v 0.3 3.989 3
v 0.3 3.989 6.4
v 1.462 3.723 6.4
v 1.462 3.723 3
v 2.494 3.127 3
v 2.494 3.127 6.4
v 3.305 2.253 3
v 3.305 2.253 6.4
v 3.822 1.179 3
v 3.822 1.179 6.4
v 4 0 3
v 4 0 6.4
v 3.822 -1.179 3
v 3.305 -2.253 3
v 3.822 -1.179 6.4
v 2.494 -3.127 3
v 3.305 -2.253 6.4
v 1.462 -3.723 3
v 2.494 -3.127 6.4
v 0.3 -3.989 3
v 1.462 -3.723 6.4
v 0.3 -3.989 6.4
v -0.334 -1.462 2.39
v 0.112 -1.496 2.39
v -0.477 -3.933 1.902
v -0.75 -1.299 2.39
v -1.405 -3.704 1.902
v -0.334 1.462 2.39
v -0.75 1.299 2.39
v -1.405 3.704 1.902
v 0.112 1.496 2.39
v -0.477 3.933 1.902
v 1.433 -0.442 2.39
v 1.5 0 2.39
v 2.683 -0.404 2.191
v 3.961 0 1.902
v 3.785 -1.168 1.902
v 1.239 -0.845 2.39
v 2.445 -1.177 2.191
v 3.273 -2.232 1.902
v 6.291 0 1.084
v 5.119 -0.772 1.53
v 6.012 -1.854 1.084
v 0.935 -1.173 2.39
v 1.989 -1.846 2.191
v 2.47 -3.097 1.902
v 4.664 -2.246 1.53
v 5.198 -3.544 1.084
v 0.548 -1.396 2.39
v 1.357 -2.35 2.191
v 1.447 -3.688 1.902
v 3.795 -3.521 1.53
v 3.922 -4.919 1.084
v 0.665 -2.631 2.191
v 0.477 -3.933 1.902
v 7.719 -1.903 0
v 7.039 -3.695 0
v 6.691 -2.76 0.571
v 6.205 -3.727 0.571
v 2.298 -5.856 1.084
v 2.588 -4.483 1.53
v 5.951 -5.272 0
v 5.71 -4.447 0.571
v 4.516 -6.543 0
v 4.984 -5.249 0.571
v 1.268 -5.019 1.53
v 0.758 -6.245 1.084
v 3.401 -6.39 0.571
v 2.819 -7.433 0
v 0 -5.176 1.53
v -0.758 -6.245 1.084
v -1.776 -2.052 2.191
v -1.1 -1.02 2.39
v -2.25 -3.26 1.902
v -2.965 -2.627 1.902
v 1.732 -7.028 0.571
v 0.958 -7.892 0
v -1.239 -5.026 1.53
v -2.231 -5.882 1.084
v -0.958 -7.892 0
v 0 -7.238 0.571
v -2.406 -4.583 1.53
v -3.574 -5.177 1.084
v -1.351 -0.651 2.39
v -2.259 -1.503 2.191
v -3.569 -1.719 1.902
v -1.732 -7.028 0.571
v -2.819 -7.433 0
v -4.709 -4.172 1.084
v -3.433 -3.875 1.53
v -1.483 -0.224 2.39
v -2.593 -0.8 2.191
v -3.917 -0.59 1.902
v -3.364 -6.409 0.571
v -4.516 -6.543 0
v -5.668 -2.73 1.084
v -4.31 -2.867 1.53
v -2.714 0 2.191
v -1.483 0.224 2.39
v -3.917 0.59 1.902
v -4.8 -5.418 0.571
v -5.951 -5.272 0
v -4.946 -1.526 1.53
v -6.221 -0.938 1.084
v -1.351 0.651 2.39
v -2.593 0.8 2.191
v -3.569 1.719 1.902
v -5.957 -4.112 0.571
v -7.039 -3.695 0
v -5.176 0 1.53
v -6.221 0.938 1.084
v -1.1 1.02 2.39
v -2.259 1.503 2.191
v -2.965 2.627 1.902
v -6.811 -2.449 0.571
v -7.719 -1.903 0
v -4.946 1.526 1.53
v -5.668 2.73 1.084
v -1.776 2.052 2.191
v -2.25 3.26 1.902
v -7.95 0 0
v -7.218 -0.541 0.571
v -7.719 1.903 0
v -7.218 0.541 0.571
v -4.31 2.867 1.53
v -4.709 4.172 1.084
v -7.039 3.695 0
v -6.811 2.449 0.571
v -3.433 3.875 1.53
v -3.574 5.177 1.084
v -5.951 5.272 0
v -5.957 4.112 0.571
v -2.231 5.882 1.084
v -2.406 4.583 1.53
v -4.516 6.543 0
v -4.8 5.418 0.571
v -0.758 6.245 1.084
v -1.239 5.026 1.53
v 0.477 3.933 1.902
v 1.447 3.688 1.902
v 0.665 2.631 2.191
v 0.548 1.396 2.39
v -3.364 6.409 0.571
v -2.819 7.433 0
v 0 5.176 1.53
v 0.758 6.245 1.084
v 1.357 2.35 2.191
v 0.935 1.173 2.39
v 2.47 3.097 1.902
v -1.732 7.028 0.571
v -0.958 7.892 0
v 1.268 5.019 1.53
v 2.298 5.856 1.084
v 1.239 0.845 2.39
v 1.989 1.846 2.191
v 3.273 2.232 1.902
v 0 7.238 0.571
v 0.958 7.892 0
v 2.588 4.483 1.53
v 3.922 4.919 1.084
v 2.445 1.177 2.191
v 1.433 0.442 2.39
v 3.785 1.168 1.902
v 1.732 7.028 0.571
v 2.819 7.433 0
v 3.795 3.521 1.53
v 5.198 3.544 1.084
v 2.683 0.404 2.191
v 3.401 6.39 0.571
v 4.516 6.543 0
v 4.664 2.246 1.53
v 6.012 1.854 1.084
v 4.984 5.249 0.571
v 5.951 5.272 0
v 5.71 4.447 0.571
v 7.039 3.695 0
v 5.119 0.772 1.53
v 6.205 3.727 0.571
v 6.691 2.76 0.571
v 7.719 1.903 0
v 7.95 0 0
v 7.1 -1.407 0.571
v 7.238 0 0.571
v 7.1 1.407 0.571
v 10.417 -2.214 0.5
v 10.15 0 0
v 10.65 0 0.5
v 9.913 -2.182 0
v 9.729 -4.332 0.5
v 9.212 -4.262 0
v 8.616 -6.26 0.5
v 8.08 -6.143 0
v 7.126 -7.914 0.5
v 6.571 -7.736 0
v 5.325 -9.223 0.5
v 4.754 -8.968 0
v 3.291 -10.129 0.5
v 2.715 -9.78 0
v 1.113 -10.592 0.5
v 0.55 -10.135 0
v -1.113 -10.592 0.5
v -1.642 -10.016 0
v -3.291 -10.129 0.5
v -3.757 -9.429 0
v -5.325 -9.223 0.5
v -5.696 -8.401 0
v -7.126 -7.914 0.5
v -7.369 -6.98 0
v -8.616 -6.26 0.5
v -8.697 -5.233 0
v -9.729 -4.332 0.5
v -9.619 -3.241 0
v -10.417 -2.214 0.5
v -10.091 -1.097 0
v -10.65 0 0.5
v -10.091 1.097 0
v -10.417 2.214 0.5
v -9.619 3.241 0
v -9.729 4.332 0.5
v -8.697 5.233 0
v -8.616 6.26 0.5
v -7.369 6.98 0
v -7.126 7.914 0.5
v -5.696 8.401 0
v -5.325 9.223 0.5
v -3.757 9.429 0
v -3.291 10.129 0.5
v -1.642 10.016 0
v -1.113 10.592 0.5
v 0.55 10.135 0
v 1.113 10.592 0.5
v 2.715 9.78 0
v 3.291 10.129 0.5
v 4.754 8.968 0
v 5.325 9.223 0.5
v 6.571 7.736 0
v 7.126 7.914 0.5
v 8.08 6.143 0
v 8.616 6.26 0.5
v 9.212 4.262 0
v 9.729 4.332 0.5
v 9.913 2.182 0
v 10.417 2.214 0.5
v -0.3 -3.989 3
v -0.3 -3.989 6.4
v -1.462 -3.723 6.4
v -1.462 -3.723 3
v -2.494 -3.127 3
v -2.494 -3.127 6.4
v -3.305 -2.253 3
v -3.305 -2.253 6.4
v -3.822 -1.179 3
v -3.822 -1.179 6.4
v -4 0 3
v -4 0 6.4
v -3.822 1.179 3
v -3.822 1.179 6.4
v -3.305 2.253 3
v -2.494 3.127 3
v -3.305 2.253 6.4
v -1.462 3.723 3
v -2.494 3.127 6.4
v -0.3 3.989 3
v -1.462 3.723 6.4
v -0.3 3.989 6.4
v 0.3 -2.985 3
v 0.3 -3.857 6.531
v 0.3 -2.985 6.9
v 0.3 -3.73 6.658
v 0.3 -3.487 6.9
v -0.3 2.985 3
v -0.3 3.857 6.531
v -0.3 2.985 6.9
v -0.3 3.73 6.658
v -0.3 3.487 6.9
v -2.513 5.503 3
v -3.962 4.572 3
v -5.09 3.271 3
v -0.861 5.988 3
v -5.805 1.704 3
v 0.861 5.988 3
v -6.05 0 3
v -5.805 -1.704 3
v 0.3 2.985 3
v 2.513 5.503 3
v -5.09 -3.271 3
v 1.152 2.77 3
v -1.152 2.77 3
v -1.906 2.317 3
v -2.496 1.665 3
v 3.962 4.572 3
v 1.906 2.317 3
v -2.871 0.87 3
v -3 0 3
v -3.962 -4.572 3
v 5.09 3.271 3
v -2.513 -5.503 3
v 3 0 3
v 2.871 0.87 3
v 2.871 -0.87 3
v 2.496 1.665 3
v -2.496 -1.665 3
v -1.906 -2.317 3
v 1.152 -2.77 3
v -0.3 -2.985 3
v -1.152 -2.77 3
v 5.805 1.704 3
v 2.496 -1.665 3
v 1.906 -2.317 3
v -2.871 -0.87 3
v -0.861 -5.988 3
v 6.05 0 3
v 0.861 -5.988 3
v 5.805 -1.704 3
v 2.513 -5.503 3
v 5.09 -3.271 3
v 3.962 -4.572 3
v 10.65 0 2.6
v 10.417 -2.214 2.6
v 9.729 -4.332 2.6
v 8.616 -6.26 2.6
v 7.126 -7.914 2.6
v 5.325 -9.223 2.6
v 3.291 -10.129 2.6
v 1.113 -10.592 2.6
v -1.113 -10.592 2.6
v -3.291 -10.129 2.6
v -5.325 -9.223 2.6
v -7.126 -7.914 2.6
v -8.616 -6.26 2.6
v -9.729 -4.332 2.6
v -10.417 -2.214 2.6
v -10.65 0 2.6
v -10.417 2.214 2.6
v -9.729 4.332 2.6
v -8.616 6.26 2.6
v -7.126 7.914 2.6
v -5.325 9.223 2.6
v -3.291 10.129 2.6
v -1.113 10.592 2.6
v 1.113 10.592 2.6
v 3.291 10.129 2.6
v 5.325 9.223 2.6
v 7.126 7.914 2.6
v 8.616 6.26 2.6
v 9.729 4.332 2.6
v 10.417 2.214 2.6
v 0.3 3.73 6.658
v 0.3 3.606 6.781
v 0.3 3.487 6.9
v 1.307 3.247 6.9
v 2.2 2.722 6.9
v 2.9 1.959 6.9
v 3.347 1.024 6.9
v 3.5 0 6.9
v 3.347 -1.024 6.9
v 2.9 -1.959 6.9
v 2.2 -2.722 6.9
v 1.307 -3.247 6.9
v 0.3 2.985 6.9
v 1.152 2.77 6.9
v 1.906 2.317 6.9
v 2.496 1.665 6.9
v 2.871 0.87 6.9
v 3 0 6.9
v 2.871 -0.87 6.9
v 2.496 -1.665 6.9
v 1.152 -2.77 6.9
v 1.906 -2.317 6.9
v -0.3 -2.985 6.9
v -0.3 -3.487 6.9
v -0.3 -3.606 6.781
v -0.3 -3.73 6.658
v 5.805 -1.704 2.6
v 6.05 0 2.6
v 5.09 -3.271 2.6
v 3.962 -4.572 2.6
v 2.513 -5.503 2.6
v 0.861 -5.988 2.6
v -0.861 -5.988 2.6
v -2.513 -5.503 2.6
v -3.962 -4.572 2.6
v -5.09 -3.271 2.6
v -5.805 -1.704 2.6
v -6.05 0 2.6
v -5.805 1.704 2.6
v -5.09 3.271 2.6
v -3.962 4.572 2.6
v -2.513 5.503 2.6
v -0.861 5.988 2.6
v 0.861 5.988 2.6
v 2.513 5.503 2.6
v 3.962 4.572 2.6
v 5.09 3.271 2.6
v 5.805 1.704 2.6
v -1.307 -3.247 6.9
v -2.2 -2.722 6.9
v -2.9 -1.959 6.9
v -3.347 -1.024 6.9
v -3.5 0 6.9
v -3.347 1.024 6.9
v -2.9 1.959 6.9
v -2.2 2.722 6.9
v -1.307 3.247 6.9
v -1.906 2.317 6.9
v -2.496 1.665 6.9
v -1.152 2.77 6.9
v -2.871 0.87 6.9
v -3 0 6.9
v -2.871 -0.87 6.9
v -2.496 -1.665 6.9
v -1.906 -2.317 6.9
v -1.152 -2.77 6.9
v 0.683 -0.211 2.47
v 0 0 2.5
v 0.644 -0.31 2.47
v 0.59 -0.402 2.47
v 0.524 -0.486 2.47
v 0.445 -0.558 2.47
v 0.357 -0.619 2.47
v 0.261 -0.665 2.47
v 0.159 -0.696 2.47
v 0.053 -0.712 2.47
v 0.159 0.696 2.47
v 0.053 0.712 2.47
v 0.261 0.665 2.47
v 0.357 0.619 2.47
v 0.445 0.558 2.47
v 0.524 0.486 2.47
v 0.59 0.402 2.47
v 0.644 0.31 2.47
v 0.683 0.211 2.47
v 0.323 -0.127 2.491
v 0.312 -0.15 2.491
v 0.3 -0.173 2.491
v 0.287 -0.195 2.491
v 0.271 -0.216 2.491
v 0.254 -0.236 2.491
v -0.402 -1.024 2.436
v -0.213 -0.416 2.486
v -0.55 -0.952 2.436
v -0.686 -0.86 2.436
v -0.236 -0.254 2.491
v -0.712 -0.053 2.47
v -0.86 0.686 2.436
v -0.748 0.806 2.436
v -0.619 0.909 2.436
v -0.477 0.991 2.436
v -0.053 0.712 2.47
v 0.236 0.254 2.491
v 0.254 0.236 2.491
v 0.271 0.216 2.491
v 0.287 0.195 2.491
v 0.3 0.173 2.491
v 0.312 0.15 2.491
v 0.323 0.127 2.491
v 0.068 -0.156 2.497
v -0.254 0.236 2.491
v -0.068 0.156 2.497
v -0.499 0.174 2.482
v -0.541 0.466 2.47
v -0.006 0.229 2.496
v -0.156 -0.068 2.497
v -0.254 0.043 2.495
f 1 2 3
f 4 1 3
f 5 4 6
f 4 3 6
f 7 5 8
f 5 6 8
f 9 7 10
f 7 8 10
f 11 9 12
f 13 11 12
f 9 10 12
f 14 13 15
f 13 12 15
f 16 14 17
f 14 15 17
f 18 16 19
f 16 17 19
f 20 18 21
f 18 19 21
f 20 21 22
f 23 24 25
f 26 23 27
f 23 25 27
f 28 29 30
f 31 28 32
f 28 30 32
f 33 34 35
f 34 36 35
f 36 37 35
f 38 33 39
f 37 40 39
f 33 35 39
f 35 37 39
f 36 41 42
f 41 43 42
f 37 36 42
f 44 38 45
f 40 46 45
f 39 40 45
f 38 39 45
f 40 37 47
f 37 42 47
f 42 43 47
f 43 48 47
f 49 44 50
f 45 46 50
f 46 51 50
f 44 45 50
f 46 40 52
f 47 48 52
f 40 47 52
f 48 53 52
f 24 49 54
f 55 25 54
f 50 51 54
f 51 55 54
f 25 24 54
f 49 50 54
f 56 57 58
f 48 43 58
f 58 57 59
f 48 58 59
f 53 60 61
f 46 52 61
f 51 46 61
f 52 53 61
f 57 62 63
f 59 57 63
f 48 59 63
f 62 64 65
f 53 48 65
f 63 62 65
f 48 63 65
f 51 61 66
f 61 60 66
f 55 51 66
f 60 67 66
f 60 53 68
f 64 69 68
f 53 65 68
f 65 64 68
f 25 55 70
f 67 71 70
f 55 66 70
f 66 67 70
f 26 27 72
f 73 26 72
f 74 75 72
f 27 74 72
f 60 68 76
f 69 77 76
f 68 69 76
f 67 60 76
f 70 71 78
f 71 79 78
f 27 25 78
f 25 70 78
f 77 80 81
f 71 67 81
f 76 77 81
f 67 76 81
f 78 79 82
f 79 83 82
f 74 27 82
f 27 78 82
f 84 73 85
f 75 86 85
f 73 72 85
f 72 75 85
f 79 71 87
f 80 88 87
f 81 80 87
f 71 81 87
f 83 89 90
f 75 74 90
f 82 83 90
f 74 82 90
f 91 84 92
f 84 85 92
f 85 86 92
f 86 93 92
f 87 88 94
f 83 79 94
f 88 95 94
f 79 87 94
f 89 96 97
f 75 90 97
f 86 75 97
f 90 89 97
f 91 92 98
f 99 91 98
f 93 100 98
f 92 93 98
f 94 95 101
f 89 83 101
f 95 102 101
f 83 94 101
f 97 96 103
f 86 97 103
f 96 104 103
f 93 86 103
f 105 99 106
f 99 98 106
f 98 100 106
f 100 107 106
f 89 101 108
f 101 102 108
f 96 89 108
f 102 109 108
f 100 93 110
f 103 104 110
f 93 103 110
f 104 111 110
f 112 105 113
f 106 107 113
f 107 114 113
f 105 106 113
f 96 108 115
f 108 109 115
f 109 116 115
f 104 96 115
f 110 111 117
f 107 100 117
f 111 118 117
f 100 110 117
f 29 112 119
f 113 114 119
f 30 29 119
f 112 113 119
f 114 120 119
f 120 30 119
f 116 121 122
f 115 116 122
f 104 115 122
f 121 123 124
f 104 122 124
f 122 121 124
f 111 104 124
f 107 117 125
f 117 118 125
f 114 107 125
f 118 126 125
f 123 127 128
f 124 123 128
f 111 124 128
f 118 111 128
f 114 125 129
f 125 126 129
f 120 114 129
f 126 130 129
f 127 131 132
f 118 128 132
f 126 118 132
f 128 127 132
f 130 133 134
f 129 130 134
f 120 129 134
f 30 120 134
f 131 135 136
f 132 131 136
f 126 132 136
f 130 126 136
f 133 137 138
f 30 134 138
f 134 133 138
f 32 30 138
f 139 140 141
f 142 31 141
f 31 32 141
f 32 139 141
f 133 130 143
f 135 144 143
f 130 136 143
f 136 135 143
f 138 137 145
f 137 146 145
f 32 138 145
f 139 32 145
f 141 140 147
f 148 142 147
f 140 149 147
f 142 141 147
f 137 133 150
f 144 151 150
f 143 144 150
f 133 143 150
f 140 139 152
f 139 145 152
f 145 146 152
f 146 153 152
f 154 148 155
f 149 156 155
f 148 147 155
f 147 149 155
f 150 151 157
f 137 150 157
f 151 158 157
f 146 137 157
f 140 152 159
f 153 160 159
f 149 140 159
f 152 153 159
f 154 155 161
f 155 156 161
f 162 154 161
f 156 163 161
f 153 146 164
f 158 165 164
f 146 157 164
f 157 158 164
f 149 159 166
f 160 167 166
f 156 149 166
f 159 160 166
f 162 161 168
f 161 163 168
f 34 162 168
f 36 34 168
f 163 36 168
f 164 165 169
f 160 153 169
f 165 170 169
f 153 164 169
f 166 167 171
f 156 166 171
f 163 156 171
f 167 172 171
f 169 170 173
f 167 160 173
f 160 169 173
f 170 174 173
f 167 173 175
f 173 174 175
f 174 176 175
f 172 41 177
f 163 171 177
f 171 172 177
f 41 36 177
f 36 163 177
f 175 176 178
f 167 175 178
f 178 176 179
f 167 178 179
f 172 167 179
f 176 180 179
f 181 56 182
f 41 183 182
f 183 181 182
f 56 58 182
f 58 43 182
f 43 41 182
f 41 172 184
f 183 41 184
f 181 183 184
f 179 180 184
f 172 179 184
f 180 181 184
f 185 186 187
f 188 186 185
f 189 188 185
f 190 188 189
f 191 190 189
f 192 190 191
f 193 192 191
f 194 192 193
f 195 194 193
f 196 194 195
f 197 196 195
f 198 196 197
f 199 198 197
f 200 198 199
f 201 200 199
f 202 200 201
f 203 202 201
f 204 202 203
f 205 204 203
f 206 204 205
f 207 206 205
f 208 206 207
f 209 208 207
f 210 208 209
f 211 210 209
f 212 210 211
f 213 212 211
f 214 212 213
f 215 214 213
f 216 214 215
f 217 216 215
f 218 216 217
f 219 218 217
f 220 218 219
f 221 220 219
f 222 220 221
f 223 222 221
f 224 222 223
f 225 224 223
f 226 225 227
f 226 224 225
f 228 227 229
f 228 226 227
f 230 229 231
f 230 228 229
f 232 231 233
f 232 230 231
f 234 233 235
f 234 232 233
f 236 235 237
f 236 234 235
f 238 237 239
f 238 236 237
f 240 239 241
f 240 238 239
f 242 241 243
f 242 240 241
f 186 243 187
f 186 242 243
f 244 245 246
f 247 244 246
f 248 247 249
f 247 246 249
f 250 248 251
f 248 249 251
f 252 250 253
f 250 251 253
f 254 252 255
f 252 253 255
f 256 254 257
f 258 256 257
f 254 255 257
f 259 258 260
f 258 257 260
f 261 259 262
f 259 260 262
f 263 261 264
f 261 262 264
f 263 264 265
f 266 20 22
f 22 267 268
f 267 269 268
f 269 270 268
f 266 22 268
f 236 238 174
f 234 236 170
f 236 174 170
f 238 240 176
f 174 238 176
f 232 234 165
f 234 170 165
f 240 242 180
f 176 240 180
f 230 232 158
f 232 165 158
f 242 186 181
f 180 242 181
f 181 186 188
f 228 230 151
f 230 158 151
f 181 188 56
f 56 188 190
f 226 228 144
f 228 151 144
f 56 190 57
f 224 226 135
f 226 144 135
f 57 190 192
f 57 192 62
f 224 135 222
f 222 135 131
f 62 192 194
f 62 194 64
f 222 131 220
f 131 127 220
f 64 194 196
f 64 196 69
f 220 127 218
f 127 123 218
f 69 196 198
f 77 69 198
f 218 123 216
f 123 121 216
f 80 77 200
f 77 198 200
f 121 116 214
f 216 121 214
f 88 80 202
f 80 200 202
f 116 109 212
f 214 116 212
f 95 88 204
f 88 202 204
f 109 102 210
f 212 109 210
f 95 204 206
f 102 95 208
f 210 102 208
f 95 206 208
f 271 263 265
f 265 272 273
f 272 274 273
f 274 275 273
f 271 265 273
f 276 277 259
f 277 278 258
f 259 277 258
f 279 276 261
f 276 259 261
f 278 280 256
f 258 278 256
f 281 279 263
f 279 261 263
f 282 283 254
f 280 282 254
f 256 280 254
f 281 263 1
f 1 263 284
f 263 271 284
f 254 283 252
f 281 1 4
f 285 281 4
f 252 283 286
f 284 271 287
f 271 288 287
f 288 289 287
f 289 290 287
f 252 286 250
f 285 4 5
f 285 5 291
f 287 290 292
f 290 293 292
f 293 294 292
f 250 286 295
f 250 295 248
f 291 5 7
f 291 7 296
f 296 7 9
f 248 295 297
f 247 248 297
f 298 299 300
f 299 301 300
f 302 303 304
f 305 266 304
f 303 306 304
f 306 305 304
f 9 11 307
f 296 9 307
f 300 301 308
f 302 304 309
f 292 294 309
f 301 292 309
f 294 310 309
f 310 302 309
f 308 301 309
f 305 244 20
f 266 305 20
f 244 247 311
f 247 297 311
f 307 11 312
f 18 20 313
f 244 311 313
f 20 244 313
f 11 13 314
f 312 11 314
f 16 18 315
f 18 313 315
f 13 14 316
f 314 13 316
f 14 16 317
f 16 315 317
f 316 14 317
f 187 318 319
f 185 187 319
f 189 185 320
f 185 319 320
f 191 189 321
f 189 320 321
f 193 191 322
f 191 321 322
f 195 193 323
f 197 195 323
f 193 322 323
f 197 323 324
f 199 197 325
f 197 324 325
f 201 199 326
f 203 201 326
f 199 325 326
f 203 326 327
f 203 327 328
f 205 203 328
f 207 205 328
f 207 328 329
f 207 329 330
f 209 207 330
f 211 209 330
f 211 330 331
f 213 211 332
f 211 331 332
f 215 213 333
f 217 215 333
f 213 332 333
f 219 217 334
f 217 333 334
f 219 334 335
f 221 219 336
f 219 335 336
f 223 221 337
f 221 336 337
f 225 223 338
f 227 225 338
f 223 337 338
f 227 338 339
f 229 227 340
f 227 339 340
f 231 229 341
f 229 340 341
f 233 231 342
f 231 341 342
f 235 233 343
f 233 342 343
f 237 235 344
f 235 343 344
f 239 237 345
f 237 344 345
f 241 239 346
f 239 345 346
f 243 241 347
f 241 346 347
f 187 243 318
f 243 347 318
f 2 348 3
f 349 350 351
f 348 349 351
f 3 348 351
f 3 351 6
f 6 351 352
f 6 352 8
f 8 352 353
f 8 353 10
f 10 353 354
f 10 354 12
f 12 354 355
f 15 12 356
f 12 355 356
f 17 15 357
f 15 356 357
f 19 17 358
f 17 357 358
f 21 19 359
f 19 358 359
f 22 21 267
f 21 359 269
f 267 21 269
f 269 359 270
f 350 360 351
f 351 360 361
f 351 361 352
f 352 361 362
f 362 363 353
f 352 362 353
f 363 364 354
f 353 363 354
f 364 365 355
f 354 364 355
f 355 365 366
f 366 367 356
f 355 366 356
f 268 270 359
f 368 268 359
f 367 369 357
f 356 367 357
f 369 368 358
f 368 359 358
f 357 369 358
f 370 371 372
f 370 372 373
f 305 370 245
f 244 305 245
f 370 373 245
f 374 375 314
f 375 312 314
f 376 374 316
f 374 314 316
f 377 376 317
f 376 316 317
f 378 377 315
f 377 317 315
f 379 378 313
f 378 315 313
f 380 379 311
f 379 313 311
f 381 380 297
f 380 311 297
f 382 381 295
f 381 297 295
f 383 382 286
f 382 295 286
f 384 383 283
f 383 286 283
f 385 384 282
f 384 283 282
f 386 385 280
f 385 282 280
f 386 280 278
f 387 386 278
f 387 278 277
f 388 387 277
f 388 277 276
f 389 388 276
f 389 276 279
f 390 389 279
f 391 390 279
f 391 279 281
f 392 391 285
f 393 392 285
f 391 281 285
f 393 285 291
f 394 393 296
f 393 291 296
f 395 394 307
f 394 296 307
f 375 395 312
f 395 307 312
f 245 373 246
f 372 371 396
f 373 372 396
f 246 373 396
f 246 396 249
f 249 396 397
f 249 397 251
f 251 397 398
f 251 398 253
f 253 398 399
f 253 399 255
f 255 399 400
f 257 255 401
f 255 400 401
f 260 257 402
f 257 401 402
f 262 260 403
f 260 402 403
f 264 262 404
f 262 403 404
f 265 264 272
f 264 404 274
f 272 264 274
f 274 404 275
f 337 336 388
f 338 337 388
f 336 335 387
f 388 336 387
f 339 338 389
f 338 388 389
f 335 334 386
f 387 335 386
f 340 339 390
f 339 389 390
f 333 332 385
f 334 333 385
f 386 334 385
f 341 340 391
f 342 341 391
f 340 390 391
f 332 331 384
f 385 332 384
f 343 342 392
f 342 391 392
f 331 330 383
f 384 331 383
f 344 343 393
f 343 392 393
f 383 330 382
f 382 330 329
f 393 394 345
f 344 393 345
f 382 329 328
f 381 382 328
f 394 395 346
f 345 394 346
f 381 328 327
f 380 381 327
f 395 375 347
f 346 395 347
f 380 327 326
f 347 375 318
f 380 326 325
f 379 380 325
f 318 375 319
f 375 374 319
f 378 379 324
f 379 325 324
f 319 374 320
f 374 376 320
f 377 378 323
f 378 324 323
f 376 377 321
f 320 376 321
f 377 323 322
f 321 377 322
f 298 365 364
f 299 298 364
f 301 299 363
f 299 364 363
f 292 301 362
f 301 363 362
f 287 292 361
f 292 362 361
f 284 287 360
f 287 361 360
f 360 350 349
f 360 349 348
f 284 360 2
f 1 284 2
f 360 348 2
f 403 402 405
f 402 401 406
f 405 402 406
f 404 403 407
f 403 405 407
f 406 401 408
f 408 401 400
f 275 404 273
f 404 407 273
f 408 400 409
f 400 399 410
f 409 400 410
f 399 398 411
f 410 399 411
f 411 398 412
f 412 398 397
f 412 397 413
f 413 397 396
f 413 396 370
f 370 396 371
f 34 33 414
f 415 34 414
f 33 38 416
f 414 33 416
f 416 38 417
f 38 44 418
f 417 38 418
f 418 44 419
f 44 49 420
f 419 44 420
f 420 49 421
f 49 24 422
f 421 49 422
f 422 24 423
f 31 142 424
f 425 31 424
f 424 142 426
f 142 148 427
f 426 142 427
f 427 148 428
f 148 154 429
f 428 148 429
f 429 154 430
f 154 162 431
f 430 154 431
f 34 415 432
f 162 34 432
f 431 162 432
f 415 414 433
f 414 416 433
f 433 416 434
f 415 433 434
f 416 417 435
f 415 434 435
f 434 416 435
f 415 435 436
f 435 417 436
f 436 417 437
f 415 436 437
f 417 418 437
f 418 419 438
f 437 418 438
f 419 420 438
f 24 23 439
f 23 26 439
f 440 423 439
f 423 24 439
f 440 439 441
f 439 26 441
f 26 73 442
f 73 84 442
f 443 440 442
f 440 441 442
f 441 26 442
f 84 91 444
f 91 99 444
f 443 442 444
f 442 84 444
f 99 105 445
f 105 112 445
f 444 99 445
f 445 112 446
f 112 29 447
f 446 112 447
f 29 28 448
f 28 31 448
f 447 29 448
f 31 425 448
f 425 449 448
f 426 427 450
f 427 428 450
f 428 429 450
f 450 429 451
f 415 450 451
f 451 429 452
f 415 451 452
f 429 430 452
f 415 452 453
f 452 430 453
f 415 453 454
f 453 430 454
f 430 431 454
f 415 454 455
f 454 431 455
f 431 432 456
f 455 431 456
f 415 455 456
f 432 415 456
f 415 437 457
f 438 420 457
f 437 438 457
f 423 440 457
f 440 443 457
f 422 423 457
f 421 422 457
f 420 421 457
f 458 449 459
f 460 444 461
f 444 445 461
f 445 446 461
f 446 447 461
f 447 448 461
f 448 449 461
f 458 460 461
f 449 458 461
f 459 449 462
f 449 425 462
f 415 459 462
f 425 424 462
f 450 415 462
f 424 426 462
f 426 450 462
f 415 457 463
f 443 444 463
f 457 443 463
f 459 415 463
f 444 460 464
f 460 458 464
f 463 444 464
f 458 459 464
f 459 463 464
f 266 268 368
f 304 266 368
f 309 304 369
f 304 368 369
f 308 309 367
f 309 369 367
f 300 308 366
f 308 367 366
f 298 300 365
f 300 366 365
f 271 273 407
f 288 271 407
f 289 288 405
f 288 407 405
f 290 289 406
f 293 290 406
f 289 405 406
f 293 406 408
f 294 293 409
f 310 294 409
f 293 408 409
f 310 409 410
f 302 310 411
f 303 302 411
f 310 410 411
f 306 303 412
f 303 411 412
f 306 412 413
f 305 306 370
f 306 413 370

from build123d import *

# Parameters (mm, degrees)
F2_SIZE  = 0.5
F3_SIZE  = 0.5
F6_DEPTH = 3.9


with BuildPart() as f1:
    # F0 (on Front) → F1 (revolve)
    with BuildSketch(Plane.XZ):
        with BuildLine():
            add(Edge.make_bspline(
                [(1.5, 2.3895676483), (3.8476854245, 2.0883835805), (6.8060247503, 1.1954580218), (7.95, 0)],
                knots=[1.5645237171, 1.5645237171, 1.5645237171, 1.5645237171, 8.3338166527, 8.3338166527, 8.3338166527, 8.3338166527], degree=3))
            Line((7.95, 0), (10.65, 0))
            Line((10.65, 0), (10.65, 2.6))
            Line((10.65, 2.6), (6.05, 2.6))
            Line((6.05, 2.6), (6.05, 3))
            Line((6.05, 3), (4, 3))
            Line((4, 3), (4, 6.9))
            Line((4, 6.9), (0, 6.9))
            Line((0, 6.9), (0, 2.8895676483))
            Line((0, 2.8895676483), (1.5, 2.8895676483))
            Line((1.5, 2.8895676483), (1.5, 2.3895676483))
        make_face()
        with BuildLine():
            Line((0, 2.8895676483), (0, 2.5))
            add(Edge.make_bspline(
                [(0, 2.5), (0.4474217695, 2.4971784695), (0.9574013029, 2.4591775207), (1.5, 2.3895676483)],
                knots=[0, 0, 0, 0, 1.5645237171, 1.5645237171, 1.5645237171, 1.5645237171], degree=3))
            Line((1.5, 2.3895676483), (1.5, 2.8895676483))
            Line((1.5, 2.8895676483), (0, 2.8895676483))
        make_face()
    revolve(axis=Axis((0, 0, 3.45), (0, 0, -1)))

    # F2
    f2_edges = [f1.edges().sort_by_distance(p)[0] for p in [
        (-4, 0, 6.9),
    ]]
    chamfer(f2_edges, length=F2_SIZE)

    # F3
    f3_edges = [f1.edges().sort_by_distance(p)[0] for p in [
        (-10.65, 0, 0),
    ]]
    chamfer(f3_edges, length=F3_SIZE)

    # F5 (on offset) → F6 (cut)
    with BuildSketch(Plane.XY.offset(6.9)):
        with BuildLine():
            ThreePointArc((0.3, -2.9849623113), (2.2248595461, -2.0124611797), (3, 0))
            ThreePointArc((3, 0), (2.2248595461, 2.0124611797), (0.3, 2.9849623113))
            Line((0.3, 2.9849623113), (0.3, 0))
            Line((0.3, 0), (0.3, -2.9849623113))
        make_face()
        with BuildLine():
            Line((0.3, 0), (0.3, 2.9849623113))
            ThreePointArc((0.3, 2.9849623113), (0, 3), (-0.3, 2.9849623113))
            Line((-0.3, 2.9849623113), (-0.3, 0))
            Line((-0.3, 0), (0, 0))
            Line((0, 0), (0.3, 0))
        make_face()
        with BuildLine():
            ThreePointArc((-0.3, 2.9849623113), (0, 3), (0.3, 2.9849623113))
            Line((0.3, 2.9849623113), (0.3, 4.0277631488))
            Line((0.3, 4.0277631488), (-0.3, 4.0277631488))
            Line((-0.3, 4.0277631488), (-0.3, 2.9849623113))
        make_face()
        with BuildLine():
            Line((0.3, -4.2378189974), (0.3, -2.9849623113))
            ThreePointArc((0.3, -2.9849623113), (0, -3), (-0.3, -2.9849623113))
            Line((-0.3, -2.9849623113), (-0.3, -4.2378189974))
            Line((-0.3, -4.2378189974), (0.3, -4.2378189974))
        make_face()
        with BuildLine():
            ThreePointArc((-0.3, -2.9849623113), (0, -3), (0.3, -2.9849623113))
            Line((0.3, -2.9849623113), (0.3, 0))
            Line((0.3, 0), (0, 0))
            Line((0, 0), (-0.3, 0))
            Line((-0.3, 0), (-0.3, -2.9849623113))
        make_face()
        with BuildLine():
            Line((-0.3, 0), (-0.3, 2.9849623113))
            ThreePointArc((-0.3, 2.9849623113), (-3, 0), (-0.3, -2.9849623113))
            Line((-0.3, -2.9849623113), (-0.3, 0))
        make_face()
    extrude(amount=-F6_DEPTH, mode=Mode.SUBTRACT)


solid = f1.part
